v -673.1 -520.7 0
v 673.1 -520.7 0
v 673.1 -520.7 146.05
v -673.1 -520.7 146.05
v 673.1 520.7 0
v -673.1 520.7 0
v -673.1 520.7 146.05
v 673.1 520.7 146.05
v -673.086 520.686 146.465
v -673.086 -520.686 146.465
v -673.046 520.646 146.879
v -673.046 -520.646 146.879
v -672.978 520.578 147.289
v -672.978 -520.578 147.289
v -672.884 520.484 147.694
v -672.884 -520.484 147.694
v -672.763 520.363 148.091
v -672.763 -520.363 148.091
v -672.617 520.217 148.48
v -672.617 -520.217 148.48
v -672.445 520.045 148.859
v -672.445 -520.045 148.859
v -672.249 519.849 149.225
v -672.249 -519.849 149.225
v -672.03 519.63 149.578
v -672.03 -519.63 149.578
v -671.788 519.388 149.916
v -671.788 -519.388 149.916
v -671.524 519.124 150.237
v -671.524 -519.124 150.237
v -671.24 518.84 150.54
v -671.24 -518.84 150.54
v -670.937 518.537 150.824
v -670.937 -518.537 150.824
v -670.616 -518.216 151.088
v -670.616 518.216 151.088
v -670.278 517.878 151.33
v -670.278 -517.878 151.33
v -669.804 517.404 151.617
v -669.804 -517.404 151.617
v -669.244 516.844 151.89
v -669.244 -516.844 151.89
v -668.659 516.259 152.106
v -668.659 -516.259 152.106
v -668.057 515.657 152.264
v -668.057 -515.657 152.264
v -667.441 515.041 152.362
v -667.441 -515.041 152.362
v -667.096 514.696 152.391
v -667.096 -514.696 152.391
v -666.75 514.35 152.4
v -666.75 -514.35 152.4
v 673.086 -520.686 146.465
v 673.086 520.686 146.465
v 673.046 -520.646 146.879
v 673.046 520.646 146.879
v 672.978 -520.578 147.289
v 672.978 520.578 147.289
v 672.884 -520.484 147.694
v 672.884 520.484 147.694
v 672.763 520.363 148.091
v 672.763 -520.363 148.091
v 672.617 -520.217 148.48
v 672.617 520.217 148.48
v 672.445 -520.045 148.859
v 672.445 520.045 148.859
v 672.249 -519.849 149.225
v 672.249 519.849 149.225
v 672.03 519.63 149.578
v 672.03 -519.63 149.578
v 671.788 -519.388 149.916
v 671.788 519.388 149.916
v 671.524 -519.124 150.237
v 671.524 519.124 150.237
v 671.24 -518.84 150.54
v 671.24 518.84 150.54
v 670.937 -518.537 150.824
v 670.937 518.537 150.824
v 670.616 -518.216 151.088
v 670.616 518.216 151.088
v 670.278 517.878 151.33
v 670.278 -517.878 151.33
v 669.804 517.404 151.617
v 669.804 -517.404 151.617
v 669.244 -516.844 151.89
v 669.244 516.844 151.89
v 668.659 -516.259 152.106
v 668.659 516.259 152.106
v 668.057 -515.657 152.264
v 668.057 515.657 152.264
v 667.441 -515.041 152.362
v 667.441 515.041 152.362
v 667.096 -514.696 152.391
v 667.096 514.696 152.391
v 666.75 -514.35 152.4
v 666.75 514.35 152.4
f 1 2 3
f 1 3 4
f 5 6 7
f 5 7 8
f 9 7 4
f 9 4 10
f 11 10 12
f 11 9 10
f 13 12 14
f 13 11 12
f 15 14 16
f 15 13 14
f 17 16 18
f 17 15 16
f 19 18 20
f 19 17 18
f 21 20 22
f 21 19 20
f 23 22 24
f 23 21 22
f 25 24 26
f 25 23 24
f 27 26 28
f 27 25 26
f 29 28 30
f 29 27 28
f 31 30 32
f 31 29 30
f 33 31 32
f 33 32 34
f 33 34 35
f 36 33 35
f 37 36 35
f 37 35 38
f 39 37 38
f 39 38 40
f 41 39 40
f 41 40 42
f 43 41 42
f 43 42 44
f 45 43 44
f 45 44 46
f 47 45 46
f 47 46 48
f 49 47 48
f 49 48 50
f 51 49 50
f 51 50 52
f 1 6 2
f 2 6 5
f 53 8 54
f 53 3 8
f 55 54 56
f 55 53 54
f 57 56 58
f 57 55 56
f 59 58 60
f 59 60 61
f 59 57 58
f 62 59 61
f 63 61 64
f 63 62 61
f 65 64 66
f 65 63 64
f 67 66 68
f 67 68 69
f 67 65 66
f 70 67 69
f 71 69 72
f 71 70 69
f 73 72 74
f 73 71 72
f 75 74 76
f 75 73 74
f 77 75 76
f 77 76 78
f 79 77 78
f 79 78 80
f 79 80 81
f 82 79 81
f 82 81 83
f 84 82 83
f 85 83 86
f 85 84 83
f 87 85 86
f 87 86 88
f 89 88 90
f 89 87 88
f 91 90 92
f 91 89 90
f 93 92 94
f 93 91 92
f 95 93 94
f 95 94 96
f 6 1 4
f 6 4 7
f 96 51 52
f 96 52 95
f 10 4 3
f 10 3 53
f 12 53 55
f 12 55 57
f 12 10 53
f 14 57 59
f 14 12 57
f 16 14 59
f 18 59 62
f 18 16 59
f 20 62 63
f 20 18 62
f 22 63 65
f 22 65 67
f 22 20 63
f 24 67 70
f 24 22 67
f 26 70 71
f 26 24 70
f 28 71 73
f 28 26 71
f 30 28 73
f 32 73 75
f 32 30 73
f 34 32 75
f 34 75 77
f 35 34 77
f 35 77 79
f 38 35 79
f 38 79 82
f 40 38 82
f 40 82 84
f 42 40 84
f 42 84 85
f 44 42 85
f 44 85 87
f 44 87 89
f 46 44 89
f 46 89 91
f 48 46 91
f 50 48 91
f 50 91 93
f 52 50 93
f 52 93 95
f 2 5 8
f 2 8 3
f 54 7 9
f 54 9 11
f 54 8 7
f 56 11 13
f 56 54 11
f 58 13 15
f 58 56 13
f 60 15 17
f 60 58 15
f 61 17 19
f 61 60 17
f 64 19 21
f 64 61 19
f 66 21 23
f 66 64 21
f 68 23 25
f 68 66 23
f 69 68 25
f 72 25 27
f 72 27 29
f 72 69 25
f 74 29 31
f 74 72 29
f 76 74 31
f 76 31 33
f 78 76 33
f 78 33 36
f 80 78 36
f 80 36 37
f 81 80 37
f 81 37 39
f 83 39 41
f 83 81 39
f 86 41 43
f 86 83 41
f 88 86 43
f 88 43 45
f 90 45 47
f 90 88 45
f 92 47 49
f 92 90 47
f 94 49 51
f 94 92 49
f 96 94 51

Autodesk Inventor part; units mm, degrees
ref_plane "YZ Plane" through (0, 0, 0) normal (1, 0, 0) x (0, 1, 0)
ref_plane "XZ Plane" through (0, 0, 0) normal (0, 1, 0) x (-1, 0, 0)
ref_plane "XY Plane" through (0, 0, 0) normal (0, 0, 1) x (1, 0, 0)
sketch "Sketch1" plane through (0, 0, 0) normal (0, 0, 1) x (1, 0, 0)
  line L0 (-673.1, 520.7) -> (673.1, 520.7)
  line L1 (673.1, 520.7) -> (673.1, -520.7)
  line L2 (673.1, -520.7) -> (-673.1, -520.7)
  line L3 (-673.1, -520.7) -> (-673.1, 520.7)
  line L4 (-673.1, 520.7) -> (673.1, -520.7) construction
  line L5 (673.1, 520.7) -> (-673.1, -520.7) construction
  point P0 (0, 0)
  dimension "d0" = 1346.2
  dimension "d1" = 1041.4
extrude "Extrusion1" add sketch "Sketch1" along normal blind 152.4
fillet "Fillet1" radius 6.35 4 edges at (0, 520.7, 152.4) (673.1, 0, 152.4) (0, -520.7, 152.4) (-673.1, 0, 152.4)
properties part number "9-1x-53x41x6 sn step" material "Granite, Cut, Polished"
